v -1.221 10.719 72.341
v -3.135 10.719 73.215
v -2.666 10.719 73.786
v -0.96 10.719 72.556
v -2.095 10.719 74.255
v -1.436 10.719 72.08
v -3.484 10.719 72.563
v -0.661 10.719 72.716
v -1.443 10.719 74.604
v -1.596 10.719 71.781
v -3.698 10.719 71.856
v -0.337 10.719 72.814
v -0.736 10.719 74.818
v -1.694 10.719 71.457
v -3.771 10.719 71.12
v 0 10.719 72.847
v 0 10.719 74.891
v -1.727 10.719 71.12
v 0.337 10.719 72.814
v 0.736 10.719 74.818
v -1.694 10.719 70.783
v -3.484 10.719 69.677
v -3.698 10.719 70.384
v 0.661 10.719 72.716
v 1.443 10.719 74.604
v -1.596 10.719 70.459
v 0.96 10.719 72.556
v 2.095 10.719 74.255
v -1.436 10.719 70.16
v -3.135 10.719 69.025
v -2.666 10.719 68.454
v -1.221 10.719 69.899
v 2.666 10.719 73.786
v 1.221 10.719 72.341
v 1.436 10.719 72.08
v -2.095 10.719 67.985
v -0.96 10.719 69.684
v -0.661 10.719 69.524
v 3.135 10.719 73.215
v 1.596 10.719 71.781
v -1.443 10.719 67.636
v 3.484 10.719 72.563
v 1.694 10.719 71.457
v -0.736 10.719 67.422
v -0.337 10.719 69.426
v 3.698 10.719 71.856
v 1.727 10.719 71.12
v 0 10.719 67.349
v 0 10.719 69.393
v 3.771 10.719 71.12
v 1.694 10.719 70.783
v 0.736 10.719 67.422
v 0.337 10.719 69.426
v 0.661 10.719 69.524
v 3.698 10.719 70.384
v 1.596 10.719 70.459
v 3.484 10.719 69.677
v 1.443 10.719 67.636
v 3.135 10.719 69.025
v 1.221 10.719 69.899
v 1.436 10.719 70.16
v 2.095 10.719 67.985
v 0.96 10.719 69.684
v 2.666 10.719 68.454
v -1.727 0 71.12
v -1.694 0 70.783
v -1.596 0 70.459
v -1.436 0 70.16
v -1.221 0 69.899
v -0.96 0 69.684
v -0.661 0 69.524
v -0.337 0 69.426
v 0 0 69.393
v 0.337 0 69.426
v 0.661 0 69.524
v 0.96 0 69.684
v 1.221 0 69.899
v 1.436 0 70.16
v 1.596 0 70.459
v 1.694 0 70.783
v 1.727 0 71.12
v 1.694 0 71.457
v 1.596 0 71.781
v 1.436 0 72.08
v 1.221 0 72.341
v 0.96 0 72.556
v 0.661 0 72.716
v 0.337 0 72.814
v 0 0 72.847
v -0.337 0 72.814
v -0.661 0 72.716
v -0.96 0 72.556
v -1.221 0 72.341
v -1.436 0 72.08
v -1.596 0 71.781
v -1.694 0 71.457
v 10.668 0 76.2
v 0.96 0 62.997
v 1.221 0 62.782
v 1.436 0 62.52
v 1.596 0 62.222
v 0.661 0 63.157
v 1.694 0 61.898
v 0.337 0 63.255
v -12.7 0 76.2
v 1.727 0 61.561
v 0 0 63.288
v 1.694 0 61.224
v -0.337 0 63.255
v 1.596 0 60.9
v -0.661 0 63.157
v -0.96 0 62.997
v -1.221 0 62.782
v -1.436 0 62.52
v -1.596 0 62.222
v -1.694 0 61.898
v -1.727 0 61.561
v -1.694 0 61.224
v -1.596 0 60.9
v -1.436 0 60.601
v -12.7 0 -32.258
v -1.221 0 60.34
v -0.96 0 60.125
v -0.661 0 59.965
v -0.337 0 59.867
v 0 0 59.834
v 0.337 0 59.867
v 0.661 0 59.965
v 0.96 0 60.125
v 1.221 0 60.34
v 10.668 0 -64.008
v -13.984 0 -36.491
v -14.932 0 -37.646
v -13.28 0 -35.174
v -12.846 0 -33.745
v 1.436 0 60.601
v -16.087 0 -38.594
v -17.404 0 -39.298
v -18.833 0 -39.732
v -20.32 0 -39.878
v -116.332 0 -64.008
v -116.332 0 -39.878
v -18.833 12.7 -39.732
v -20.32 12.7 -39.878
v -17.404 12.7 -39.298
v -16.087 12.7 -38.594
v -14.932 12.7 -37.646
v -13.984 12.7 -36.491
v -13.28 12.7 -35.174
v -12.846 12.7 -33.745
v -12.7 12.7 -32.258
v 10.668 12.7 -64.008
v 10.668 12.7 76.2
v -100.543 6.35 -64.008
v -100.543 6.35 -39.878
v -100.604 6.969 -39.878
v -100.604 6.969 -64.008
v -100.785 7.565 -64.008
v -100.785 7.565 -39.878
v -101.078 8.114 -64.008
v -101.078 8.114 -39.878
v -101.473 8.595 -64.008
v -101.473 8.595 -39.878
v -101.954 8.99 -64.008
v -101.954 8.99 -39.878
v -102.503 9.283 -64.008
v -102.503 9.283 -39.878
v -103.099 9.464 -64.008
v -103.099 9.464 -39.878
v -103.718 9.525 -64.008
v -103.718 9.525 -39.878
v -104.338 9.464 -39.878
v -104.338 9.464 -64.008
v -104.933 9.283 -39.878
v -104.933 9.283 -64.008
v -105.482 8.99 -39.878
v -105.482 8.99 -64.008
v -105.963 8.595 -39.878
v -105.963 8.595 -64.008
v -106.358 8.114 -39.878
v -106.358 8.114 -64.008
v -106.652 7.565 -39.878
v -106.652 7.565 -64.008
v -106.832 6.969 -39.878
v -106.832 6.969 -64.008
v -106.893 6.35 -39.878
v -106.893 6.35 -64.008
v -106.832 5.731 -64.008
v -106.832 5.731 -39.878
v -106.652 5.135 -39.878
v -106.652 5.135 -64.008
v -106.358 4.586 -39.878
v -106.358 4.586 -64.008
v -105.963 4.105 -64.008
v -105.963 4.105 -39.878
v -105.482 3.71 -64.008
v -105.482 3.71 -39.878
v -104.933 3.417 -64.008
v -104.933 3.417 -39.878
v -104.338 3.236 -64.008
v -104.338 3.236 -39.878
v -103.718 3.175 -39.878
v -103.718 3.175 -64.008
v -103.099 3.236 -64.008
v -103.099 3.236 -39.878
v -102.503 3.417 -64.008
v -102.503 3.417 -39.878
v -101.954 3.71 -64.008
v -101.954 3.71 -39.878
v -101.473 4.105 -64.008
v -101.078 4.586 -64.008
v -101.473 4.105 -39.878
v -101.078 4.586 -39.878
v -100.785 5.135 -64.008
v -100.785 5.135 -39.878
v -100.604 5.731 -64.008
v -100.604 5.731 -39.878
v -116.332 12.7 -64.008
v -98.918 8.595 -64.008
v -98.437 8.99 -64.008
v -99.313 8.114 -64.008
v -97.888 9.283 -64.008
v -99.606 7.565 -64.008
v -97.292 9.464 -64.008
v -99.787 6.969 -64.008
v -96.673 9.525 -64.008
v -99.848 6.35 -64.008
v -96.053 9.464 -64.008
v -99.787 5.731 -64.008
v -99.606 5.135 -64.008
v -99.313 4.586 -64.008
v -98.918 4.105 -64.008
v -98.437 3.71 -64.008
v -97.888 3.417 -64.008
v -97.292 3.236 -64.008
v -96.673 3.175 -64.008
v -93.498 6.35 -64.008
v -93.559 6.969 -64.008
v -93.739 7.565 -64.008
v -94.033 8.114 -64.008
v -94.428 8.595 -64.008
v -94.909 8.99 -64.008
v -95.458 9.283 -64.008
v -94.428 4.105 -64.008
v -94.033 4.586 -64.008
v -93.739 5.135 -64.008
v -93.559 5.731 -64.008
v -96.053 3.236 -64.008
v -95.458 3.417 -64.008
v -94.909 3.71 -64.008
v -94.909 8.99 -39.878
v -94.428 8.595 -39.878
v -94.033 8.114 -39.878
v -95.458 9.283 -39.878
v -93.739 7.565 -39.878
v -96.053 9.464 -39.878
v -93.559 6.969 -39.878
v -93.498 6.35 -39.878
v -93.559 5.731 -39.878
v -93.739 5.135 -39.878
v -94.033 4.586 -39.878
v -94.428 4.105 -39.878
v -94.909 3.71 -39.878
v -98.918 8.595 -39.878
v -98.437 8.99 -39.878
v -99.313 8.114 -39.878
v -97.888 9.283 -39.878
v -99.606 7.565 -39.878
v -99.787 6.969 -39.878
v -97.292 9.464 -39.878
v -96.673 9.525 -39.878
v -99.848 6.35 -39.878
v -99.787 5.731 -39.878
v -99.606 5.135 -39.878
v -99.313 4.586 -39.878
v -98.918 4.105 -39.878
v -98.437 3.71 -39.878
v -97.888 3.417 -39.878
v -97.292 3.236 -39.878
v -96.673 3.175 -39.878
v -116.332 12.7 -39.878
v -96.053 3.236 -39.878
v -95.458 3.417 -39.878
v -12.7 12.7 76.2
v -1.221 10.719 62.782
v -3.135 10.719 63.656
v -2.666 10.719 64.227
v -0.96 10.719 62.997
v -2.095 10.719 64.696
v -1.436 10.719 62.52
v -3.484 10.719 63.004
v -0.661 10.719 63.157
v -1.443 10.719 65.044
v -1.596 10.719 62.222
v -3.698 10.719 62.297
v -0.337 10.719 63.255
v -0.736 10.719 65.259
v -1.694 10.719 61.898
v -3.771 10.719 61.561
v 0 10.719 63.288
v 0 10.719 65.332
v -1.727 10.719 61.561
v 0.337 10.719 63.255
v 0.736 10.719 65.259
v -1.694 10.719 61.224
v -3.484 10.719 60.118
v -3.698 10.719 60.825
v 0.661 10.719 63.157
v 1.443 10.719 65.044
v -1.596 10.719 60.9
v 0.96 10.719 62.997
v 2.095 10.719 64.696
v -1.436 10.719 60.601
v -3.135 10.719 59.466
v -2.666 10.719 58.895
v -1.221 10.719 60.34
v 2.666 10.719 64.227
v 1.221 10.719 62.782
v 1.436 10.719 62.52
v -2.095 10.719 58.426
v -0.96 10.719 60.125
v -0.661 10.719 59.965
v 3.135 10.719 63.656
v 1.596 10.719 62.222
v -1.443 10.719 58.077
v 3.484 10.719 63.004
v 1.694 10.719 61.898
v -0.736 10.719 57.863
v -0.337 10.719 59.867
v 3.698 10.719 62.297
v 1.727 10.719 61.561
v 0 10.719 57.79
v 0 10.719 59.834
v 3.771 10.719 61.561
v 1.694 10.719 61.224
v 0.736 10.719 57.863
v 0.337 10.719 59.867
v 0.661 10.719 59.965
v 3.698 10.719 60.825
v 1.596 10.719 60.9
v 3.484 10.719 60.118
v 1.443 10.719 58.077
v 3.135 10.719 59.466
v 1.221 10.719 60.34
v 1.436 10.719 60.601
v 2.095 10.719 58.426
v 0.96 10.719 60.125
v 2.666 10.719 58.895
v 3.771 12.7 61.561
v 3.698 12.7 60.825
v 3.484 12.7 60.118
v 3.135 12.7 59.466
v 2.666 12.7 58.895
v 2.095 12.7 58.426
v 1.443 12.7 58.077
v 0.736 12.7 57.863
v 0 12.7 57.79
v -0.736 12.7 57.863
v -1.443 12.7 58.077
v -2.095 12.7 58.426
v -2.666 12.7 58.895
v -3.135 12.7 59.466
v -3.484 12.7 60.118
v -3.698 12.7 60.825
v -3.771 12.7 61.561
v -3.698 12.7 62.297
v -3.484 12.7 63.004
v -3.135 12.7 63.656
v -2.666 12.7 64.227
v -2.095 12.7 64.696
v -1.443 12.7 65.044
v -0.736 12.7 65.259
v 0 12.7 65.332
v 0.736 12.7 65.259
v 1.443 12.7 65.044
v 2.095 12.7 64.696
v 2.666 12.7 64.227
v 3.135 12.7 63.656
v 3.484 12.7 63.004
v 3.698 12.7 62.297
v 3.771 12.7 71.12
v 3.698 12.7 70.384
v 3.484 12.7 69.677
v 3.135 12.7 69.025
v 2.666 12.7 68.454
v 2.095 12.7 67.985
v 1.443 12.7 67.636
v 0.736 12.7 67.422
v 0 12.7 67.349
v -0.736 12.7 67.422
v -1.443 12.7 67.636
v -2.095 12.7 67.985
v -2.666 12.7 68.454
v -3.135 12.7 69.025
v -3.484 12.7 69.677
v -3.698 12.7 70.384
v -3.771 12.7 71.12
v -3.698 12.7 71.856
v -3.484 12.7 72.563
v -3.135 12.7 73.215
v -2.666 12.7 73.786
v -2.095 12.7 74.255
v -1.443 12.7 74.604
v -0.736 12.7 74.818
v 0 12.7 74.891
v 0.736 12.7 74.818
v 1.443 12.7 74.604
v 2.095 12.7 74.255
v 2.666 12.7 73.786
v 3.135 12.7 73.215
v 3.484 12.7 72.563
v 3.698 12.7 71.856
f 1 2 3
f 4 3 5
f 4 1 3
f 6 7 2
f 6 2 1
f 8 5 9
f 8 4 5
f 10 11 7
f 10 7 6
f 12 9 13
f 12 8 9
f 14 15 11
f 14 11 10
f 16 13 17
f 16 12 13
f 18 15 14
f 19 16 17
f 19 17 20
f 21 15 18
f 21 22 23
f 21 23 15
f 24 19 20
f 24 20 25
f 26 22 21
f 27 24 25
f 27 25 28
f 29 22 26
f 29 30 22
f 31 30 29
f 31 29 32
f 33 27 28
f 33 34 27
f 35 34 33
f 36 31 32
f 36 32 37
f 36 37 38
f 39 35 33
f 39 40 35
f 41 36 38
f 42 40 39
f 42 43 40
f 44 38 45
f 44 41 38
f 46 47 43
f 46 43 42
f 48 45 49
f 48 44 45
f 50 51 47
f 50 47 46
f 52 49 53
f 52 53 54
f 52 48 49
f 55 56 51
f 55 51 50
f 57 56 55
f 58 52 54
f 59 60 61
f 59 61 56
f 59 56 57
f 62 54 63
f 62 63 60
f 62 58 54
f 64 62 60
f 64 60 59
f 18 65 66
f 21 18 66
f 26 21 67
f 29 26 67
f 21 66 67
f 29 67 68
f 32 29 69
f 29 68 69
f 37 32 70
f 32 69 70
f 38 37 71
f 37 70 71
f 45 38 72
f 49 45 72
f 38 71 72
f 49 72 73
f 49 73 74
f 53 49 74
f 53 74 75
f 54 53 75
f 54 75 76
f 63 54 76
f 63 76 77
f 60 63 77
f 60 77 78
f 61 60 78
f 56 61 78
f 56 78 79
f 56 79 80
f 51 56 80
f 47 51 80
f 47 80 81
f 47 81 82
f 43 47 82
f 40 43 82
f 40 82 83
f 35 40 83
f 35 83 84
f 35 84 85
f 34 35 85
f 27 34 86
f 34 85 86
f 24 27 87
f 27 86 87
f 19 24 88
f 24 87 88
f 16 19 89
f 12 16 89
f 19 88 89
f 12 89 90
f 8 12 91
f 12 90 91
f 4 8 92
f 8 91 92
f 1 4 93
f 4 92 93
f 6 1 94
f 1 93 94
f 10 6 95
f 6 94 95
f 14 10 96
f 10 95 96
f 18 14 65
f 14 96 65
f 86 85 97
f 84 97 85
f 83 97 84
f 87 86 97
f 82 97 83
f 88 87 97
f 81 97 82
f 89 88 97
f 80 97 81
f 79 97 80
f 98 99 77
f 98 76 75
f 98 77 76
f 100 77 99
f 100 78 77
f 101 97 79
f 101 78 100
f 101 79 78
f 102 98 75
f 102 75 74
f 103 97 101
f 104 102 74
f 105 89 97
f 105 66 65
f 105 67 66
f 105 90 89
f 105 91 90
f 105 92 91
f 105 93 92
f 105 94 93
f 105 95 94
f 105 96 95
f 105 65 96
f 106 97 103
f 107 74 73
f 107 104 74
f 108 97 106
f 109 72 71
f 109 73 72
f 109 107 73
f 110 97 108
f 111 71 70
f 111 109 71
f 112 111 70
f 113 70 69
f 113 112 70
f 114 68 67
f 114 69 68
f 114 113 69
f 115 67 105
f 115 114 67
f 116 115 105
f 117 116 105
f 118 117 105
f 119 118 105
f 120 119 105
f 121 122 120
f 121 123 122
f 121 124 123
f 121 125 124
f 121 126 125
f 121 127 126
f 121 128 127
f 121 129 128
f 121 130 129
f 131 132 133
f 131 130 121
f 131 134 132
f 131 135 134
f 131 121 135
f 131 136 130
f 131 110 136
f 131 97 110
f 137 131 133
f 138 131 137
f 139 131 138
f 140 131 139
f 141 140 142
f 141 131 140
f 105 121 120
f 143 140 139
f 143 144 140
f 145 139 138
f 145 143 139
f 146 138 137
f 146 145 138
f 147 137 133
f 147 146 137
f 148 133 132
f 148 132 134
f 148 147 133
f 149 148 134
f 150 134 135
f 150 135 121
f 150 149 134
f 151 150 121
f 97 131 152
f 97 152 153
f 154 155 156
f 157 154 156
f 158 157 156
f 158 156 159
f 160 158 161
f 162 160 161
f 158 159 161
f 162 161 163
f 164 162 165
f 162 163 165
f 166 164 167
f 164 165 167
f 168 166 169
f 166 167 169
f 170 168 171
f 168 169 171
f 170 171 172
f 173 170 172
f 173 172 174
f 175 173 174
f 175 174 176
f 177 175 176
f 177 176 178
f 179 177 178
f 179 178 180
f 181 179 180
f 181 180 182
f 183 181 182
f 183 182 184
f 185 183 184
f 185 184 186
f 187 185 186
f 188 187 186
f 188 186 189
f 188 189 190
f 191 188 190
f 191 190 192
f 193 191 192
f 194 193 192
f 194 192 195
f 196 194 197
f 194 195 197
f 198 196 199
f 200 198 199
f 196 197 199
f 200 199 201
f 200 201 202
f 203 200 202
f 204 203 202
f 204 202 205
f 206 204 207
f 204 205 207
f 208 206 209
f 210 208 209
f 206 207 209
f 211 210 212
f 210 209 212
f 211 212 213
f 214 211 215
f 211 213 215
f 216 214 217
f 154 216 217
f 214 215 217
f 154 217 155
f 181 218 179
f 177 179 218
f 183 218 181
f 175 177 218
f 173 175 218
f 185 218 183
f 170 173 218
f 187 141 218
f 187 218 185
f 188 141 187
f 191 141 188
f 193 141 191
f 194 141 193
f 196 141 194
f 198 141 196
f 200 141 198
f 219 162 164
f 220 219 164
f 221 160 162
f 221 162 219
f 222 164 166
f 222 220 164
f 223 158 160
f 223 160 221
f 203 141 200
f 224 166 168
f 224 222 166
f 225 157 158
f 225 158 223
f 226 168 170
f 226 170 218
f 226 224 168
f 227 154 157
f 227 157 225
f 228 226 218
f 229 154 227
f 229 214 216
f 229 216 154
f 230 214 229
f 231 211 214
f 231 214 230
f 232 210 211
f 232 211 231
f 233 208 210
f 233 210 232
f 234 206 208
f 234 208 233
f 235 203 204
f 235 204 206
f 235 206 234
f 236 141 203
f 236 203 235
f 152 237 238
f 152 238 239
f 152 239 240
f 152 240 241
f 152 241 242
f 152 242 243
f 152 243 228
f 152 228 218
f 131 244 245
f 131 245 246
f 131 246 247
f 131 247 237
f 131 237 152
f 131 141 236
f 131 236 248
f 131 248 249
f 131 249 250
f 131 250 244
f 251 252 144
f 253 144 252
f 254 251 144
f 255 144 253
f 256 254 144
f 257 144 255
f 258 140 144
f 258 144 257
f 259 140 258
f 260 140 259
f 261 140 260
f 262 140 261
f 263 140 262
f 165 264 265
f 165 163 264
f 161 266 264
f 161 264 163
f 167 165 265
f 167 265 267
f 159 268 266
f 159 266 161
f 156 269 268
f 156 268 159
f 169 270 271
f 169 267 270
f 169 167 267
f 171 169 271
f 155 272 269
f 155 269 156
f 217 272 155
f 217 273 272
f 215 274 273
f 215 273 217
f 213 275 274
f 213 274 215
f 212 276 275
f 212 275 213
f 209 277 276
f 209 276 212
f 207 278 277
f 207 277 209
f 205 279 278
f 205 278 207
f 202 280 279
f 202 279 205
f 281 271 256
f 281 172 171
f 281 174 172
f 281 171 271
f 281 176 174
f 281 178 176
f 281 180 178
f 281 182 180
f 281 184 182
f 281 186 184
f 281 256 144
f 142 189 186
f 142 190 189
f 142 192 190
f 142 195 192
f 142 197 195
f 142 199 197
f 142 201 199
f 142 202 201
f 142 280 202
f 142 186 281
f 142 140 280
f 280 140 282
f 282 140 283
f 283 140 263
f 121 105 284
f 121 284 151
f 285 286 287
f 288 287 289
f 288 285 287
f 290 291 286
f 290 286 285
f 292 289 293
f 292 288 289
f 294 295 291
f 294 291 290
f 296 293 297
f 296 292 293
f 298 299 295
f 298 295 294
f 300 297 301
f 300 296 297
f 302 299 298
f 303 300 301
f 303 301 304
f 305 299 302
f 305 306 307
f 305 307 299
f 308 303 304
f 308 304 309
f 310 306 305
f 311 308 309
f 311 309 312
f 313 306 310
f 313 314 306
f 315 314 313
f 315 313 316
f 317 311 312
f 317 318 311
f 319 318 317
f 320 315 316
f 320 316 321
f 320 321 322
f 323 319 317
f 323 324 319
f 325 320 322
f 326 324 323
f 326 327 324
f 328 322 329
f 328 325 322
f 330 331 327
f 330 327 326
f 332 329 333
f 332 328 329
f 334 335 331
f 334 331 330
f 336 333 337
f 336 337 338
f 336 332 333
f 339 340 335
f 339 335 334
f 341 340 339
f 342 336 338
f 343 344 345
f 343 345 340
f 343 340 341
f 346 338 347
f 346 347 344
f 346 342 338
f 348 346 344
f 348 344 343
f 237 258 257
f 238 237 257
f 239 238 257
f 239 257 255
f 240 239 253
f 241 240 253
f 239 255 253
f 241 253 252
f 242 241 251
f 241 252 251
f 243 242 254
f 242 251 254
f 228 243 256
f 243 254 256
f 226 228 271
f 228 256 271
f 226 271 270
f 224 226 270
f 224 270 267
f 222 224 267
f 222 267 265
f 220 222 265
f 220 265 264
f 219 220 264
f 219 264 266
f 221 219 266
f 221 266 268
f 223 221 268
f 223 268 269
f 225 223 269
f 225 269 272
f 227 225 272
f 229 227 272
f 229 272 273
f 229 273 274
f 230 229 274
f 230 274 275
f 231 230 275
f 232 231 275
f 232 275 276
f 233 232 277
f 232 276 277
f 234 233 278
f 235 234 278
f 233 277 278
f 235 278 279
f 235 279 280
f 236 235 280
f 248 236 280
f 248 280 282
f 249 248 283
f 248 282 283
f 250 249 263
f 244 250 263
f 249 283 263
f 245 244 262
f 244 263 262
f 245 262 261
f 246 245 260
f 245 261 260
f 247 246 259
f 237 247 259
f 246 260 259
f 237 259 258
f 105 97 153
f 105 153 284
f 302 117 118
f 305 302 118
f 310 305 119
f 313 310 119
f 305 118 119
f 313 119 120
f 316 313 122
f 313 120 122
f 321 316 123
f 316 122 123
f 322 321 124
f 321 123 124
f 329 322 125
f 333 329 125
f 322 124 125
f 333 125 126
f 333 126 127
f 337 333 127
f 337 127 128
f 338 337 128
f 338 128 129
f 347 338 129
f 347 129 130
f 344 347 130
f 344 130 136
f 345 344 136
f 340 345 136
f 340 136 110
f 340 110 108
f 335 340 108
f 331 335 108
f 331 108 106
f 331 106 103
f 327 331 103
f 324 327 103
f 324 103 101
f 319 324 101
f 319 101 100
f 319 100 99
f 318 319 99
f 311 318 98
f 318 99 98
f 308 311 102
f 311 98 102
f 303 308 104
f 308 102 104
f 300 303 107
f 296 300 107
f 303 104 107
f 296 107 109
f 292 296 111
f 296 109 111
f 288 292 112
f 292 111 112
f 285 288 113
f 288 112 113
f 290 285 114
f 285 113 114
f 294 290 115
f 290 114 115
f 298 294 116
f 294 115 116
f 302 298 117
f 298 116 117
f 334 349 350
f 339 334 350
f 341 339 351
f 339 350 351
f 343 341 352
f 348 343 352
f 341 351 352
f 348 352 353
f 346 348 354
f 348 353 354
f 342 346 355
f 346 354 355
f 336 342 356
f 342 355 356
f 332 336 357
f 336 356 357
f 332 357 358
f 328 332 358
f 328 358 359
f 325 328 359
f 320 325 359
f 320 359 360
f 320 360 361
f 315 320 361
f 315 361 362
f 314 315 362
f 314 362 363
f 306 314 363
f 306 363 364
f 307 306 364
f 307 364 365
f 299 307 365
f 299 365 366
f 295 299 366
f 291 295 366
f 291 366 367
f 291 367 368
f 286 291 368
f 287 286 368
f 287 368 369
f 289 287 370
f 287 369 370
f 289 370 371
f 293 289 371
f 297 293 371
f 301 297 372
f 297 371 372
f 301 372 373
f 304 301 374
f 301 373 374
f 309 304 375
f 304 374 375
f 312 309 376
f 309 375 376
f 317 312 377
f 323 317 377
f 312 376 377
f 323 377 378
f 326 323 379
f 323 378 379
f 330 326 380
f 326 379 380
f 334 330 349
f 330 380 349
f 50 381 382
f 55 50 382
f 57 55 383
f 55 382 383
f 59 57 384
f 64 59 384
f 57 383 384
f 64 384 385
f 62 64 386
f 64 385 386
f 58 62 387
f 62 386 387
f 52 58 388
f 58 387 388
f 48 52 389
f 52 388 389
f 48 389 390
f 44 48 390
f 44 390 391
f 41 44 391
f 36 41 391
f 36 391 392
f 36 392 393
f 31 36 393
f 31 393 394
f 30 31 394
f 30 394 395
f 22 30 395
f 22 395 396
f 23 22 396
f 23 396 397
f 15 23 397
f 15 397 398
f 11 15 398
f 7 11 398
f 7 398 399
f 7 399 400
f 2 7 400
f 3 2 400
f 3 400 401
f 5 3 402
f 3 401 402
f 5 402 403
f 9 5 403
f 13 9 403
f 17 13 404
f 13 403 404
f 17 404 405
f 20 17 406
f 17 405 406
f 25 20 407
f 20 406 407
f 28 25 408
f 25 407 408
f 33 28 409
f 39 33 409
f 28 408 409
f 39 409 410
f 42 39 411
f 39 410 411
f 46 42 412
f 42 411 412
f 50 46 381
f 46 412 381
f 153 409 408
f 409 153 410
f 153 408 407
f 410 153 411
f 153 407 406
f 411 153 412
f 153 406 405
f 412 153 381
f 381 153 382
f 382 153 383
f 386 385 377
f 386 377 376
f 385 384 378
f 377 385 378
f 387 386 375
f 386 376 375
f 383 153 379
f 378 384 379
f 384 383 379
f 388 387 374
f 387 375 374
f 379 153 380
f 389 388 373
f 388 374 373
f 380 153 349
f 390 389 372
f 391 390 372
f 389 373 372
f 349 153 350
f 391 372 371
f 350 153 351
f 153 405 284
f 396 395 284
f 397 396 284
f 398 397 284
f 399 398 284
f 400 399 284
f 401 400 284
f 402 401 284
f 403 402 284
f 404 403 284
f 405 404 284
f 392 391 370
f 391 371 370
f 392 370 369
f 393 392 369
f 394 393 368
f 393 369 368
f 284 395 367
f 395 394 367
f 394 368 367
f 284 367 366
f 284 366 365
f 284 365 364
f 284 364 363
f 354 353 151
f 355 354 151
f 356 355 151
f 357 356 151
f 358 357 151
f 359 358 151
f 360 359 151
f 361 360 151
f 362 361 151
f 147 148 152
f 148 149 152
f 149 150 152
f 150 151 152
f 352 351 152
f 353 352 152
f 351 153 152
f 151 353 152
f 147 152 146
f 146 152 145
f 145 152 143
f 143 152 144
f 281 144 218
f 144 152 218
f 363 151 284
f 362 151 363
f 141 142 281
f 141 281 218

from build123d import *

# Parameters (mm, degrees)
BOSS_EXTRUDE1_DEPTH                                 = 12.7
FILLET1_R                                           = 7.62
CBORE_FOR_5_BINDING_HEAD_MACHINE_SCREW1_D           = 3.4544
CBORE_FOR_5_BINDING_HEAD_MACHINE_SCREW1_DEPTH       = 12.7
CBORE_FOR_5_BINDING_HEAD_MACHINE_SCREW1_CBORE_D     = 7.54126
CBORE_FOR_5_BINDING_HEAD_MACHINE_SCREW1_CBORE_DEPTH = 1.9812
F_1_4_0_25_DIAMETER_HOLE2_D                         = 6.35
F_1_4_0_25_DIAMETER_HOLE2_DEPTH                     = 24.13


with BuildPart() as part:
    # Sketch1 → Boss-Extrude1 (new body)
    with BuildSketch(Plane(origin=(0, 0, 0), x_dir=(1, 0, 0), z_dir=(0, 1, 0))):
        Polygon((-12.7, 39.878), (-116.332, 39.878), (-116.332, 64.008), (10.668, 64.008), (10.668, -76.2), (-12.7, -76.2), align=None)
    extrude(amount=BOSS_EXTRUDE1_DEPTH)

    # Fillet1
    fillet1_edges = [part.edges().sort_by_distance(p)[0] for p in [
        (-12.7, 6.35, -39.878),
    ]]
    fillet(fillet1_edges, radius=FILLET1_R)

    # CBORE for #5 Binding Head Machine Screw1
    with Locations(Plane(origin=(0, 12.7, 0), x_dir=(1, 0, 0), z_dir=(0, 1, 0))):
        with Locations((0, -71.12), (0, -61.560890579)):
            CounterBoreHole(CBORE_FOR_5_BINDING_HEAD_MACHINE_SCREW1_D / 2, CBORE_FOR_5_BINDING_HEAD_MACHINE_SCREW1_CBORE_D / 2, CBORE_FOR_5_BINDING_HEAD_MACHINE_SCREW1_CBORE_DEPTH, depth=CBORE_FOR_5_BINDING_HEAD_MACHINE_SCREW1_DEPTH)

    # 1/4 (0.25) Diameter Hole2
    with Locations(Plane(origin=(0, 0, -64.008), x_dir=(-1, 0, 0), z_dir=(0, 0, -1))):
        with Locations((103.718203887, 6.35), (96.672754807, 6.35)):
            Hole(F_1_4_0_25_DIAMETER_HOLE2_D / 2, depth=F_1_4_0_25_DIAMETER_HOLE2_DEPTH)


solid = part.part
